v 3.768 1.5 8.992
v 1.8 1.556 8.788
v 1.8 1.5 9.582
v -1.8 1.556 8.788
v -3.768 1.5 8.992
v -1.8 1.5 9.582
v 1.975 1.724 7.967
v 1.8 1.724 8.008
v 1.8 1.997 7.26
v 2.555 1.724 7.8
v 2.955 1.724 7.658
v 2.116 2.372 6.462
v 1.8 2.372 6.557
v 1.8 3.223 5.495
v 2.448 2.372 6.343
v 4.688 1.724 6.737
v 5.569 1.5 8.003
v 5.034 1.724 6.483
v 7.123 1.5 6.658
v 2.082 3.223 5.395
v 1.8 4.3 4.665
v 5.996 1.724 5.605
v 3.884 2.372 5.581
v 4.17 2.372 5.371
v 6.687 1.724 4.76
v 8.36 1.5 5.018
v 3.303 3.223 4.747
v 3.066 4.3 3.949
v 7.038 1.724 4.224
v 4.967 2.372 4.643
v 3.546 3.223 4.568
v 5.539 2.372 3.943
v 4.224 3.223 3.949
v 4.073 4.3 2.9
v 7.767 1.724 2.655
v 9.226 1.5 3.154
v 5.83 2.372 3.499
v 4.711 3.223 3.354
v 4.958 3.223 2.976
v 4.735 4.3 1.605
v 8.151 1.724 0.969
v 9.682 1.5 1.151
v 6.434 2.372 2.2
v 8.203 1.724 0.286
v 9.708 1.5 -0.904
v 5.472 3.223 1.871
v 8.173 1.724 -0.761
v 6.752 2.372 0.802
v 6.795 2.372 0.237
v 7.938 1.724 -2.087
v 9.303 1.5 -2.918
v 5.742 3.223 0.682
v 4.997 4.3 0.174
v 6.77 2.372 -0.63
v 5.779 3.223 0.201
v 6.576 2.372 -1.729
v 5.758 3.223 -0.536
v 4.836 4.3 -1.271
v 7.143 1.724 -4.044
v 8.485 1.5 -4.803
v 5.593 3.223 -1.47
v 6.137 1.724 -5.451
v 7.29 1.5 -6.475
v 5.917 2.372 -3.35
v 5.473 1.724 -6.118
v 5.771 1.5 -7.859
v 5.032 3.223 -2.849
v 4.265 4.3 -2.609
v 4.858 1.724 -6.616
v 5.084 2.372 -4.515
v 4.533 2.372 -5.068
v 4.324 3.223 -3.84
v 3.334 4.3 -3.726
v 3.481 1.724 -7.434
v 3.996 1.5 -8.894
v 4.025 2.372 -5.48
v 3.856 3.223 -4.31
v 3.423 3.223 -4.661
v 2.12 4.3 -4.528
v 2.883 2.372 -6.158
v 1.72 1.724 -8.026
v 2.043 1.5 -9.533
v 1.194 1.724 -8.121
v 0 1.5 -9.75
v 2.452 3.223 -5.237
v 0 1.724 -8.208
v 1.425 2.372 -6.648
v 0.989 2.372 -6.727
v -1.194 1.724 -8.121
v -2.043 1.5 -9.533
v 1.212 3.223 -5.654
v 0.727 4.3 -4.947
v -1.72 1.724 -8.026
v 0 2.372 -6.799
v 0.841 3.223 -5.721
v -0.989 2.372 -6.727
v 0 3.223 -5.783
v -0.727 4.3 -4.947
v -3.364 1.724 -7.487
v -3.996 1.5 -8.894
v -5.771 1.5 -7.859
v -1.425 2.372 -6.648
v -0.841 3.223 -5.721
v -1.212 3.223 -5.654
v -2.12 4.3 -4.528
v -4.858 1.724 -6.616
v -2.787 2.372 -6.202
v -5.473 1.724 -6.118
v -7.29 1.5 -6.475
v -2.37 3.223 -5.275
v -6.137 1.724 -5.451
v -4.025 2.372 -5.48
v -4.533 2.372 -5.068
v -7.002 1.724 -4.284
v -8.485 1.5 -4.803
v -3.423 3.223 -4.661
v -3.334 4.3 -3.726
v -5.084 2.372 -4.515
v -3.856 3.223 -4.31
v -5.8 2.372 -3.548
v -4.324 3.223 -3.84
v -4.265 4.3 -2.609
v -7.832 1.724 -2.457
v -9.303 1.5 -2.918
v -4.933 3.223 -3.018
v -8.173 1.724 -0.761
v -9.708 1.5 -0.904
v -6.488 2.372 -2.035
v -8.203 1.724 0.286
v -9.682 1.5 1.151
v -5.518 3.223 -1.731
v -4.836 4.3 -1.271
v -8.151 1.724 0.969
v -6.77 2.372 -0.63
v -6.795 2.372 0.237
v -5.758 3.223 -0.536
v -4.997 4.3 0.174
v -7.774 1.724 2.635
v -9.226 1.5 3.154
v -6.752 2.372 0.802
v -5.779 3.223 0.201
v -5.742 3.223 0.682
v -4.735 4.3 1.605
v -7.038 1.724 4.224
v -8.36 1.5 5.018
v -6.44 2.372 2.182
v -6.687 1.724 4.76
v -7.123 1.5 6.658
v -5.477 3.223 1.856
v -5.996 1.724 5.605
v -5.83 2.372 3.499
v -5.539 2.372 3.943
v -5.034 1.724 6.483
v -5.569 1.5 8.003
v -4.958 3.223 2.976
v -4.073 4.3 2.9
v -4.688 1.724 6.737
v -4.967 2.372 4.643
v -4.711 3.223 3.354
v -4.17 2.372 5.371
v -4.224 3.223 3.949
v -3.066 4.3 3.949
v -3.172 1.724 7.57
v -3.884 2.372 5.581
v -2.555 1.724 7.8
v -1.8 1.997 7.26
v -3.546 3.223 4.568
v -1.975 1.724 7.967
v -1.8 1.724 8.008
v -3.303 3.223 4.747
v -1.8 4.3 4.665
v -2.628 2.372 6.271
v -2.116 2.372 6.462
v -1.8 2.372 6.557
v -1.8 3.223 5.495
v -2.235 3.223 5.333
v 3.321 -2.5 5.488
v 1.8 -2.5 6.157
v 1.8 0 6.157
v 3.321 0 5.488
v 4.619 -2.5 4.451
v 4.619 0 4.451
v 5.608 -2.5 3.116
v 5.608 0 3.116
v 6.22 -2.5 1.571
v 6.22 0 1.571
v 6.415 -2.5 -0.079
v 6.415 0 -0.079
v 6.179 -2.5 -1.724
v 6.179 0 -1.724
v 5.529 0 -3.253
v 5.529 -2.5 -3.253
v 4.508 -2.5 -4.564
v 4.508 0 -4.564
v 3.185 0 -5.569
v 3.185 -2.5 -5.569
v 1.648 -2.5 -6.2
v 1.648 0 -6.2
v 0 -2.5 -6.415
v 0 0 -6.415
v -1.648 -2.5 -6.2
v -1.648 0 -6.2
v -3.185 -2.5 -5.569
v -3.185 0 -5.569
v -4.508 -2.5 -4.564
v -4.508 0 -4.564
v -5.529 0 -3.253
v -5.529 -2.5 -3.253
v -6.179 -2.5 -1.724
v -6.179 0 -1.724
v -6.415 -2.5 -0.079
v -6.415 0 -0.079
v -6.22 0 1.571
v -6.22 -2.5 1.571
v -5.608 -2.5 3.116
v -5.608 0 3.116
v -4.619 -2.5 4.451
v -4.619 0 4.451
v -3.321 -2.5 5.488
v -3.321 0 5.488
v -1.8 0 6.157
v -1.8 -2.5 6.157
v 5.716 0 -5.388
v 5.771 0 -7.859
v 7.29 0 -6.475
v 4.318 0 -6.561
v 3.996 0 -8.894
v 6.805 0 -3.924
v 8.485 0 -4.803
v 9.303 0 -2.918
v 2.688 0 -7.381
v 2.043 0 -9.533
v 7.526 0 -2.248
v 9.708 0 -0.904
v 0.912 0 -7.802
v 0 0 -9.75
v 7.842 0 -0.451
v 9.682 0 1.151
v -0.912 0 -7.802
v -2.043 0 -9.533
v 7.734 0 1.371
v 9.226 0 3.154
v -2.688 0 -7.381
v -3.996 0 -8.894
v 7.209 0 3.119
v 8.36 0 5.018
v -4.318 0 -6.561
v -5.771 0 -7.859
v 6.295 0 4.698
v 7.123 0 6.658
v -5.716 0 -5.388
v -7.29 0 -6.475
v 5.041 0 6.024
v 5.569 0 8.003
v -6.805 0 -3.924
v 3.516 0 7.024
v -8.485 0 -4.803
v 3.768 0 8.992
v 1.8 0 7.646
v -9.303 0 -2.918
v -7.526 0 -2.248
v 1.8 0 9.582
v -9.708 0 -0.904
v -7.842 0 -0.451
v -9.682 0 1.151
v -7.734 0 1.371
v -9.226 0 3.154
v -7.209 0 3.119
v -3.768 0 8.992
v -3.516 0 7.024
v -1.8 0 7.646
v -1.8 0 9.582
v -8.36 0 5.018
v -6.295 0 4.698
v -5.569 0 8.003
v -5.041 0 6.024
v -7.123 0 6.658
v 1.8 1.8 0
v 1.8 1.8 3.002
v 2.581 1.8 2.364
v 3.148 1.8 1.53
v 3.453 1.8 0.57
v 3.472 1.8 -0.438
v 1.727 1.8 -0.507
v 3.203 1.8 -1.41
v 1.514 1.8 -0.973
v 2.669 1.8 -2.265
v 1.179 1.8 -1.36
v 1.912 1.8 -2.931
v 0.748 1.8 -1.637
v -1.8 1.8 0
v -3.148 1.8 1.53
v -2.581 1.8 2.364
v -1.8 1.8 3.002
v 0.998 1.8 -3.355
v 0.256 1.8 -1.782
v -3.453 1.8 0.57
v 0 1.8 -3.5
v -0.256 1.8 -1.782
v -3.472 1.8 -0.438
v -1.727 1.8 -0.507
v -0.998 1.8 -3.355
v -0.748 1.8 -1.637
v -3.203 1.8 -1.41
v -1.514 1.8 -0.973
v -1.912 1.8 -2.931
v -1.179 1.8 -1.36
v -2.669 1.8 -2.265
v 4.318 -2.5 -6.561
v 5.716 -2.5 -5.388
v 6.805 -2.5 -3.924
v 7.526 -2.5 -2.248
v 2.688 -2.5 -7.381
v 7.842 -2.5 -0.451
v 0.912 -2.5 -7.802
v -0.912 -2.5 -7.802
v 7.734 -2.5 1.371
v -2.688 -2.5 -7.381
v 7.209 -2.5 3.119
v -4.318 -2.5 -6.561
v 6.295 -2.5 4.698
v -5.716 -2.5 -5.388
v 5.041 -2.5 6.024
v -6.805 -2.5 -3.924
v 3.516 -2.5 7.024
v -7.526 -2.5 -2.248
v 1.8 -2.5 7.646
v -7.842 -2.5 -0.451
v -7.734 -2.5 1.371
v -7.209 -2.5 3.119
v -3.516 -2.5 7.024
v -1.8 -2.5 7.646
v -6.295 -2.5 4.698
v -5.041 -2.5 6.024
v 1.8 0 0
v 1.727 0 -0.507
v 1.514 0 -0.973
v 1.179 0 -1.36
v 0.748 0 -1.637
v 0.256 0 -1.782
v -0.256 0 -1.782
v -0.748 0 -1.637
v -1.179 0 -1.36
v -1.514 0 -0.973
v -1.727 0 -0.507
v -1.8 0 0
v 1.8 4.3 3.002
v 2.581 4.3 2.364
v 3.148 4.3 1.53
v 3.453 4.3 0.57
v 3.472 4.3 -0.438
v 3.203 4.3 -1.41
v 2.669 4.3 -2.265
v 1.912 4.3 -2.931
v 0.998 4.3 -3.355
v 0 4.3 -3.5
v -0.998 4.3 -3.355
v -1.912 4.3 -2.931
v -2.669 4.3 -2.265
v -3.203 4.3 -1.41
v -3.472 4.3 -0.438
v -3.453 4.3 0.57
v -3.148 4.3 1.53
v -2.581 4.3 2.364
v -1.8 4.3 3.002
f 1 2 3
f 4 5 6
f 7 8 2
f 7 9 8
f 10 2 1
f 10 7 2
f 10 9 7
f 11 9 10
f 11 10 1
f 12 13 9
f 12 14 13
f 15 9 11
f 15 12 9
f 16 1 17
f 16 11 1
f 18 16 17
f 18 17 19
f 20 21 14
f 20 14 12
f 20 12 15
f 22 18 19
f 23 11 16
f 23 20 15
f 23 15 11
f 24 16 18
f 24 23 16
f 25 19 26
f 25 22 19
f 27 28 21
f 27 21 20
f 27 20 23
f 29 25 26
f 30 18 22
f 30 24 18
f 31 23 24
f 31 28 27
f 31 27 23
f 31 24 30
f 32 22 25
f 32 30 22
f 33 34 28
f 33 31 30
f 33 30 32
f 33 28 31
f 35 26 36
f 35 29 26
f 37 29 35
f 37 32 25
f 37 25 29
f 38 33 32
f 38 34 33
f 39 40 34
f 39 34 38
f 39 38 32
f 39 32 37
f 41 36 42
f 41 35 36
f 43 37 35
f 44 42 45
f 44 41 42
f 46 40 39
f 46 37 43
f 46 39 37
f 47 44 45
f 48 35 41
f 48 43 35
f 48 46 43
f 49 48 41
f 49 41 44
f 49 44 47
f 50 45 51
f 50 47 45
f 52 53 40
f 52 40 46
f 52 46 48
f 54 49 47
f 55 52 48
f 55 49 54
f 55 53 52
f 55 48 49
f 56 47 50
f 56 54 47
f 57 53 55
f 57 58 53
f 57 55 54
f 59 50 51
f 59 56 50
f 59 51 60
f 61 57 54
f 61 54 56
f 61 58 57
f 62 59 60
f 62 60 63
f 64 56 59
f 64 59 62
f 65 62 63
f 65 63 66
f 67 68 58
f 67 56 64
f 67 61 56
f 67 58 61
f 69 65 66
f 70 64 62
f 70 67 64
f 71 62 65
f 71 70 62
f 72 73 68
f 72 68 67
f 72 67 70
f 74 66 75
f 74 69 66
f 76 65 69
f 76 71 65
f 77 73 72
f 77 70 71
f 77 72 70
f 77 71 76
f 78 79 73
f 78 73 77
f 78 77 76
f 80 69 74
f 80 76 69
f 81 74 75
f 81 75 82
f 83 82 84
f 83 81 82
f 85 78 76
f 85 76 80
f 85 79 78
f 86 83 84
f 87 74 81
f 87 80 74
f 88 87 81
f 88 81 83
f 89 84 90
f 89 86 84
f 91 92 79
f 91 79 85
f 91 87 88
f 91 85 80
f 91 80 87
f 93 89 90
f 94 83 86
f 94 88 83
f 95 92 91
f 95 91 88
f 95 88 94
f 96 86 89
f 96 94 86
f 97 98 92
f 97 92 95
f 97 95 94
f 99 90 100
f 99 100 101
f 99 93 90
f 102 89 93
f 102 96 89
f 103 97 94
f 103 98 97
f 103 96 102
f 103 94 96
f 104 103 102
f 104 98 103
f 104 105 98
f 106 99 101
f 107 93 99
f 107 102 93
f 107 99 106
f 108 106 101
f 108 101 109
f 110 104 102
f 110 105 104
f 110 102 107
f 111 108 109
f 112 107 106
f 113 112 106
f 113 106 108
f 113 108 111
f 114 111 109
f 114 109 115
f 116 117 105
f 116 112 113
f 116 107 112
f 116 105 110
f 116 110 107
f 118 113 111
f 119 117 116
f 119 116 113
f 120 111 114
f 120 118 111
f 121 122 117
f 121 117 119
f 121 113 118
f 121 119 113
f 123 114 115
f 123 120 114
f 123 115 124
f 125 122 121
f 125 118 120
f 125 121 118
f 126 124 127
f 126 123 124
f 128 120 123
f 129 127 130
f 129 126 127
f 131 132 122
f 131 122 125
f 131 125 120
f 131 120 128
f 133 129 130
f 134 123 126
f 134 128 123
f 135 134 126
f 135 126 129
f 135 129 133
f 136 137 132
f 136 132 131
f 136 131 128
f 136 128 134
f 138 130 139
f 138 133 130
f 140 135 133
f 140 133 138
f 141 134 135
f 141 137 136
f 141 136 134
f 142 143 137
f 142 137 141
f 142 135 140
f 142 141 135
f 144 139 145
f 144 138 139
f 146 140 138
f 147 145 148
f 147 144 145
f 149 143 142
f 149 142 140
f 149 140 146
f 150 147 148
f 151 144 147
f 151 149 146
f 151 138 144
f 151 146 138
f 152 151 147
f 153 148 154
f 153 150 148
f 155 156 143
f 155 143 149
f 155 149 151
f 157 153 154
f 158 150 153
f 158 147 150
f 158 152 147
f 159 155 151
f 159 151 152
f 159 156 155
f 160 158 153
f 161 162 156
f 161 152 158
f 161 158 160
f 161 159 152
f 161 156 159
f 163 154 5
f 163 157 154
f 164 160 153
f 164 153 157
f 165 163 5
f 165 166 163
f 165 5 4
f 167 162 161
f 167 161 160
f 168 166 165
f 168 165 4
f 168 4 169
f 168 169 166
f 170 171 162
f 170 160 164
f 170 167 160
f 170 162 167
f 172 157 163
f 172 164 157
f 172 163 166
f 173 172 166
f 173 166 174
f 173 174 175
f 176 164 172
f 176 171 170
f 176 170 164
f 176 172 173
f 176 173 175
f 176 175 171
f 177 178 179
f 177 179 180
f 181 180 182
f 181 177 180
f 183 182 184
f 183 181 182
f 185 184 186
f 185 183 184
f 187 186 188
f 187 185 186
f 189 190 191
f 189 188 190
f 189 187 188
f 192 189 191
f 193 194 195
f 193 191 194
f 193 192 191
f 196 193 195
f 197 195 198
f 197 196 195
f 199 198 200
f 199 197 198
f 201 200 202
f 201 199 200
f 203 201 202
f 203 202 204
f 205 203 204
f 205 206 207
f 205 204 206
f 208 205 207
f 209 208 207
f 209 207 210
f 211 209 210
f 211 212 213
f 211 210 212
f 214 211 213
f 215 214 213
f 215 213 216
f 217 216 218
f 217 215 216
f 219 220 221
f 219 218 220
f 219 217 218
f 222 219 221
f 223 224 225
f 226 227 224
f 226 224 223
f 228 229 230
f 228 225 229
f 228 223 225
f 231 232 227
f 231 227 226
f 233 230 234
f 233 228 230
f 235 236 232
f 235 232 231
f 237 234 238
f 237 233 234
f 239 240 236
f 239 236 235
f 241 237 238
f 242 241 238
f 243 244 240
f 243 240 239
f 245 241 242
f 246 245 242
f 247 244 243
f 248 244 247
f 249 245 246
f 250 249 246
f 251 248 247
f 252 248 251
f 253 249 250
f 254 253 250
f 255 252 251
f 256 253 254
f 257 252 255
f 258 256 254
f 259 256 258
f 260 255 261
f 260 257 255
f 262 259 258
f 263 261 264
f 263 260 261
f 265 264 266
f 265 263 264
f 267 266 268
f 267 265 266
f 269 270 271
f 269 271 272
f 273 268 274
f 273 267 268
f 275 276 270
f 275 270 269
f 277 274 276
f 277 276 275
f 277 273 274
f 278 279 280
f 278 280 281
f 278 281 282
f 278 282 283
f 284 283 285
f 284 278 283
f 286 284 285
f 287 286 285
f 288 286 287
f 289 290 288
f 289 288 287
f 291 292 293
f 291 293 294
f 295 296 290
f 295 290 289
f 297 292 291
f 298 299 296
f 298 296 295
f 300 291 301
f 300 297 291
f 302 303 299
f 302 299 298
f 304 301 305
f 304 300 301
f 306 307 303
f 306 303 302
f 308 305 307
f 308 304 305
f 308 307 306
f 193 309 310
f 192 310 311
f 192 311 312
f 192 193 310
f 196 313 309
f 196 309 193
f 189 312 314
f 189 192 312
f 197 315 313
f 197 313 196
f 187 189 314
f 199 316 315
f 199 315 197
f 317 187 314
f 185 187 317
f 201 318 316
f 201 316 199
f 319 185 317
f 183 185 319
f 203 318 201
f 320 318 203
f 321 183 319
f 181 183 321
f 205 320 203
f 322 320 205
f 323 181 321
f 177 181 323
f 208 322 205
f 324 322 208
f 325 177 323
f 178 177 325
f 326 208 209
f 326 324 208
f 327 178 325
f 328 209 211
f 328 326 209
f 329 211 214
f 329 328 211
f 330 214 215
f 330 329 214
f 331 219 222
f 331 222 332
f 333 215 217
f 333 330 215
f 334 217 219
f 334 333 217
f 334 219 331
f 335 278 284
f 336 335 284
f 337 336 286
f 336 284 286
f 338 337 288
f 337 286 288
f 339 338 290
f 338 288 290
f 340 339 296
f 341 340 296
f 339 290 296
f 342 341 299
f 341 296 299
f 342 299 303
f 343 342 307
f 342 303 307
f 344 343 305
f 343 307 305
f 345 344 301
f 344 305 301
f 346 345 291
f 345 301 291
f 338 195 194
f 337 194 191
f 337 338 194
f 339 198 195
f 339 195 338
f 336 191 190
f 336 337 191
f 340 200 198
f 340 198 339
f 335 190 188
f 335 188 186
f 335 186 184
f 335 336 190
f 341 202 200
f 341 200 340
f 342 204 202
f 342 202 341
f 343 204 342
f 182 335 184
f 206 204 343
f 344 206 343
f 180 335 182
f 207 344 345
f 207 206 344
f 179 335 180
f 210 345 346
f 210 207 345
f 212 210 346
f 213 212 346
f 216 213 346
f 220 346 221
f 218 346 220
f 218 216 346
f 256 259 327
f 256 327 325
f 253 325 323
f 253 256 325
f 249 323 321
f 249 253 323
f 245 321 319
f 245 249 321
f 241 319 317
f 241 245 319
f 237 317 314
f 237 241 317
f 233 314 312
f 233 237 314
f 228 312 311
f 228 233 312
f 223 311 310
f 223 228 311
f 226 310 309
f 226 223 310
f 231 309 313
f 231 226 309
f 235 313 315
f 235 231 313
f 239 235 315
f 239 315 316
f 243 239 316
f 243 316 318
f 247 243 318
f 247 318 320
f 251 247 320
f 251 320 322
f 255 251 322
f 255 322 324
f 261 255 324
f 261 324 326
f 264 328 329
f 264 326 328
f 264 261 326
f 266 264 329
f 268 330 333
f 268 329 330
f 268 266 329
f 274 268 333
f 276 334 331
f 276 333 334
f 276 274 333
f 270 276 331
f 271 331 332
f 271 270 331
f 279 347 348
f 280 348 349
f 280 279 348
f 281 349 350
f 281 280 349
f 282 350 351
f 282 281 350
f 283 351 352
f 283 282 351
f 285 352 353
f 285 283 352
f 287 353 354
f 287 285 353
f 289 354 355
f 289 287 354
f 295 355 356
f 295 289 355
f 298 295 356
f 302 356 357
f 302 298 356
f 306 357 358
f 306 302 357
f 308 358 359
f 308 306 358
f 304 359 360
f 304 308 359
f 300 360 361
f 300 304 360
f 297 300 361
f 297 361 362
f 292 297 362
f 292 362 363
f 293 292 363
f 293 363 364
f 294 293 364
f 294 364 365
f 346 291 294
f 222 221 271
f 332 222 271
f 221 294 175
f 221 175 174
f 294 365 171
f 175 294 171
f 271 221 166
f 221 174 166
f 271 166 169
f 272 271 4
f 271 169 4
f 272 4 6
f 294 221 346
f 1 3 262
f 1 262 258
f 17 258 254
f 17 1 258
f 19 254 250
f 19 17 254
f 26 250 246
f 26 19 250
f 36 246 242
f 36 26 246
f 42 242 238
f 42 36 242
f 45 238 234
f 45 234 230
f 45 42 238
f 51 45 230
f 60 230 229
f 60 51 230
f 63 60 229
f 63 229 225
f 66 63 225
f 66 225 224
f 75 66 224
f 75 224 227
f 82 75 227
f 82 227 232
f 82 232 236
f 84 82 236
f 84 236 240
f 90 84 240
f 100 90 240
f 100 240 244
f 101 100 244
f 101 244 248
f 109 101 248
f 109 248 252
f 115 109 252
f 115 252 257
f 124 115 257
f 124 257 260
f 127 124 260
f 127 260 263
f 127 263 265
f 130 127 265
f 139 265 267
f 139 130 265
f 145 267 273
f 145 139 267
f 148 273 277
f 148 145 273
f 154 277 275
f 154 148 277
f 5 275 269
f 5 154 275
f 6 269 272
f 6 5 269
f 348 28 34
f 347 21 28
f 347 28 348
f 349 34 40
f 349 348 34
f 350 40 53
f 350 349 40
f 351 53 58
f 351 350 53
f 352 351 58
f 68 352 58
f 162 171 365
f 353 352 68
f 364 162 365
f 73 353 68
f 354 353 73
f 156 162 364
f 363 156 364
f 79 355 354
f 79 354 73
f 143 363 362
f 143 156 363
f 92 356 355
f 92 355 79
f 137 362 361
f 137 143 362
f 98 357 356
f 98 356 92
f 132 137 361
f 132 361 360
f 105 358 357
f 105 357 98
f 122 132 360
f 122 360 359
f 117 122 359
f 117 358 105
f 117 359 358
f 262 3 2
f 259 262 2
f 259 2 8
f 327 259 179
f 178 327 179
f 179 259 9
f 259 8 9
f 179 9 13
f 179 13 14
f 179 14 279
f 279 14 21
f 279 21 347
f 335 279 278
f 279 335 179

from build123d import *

# Parameters (mm, degrees)
TAGLIO_ESTRUSIONE1_DEPTH = 16.374166644


with BuildPart() as part:
    # Schizzo1 → Rivoluzione1 (revolve)
    with BuildSketch(Plane.XY, mode=Mode.PRIVATE) as rivoluzione1_sk:
        with BuildLine():
            Line((0, 0), (-6.415, 0))
            Line((-6.415, 0), (-6.415, -2.5))
            Line((-6.415, -2.5), (-7.855, -2.5))
            Line((-7.855, -2.5), (-7.855, 0))
            Line((-7.855, 0), (-9.75, 0))
            Line((-9.75, 0), (-9.75, 1.5))
            ThreePointArc((-9.75, 1.5), (-6.993076896, 2.252094735), (-5, 4.3))
            Line((-5, 4.3), (-3.5, 4.3))
            Line((-3.5, 4.3), (-3.5, 1.8))
            Line((-3.5, 1.8), (0, 1.8))
            Line((0, 1.8), (0, 0))
        make_face()
    revolve(rivoluzione1_sk.sketch.rotate(Axis((0, -12.420504762, 0), (0, 1, 0)), 270), axis=Axis((0, -12.420504762, 0), (0, 1, 0)))

    # Schizzo2 → Taglio-Estrusione1 (cut, through all)
    with BuildSketch(Plane(origin=(0, 4.3, 0), x_dir=(1, 0, 0), z_dir=(0, 1, 0))):
        with BuildLine():
            Line((1.8, -9.582405752), (1.8, 0))
            ThreePointArc((1.8, 0), (0, 1.8), (-1.8, 0))
            Line((-1.8, 0), (-1.8, -9.582405752))
            ThreePointArc((-1.8, -9.582405752), (0, -9.75), (1.8, -9.582405752))
        make_face()
    extrude(amount=-TAGLIO_ESTRUSIONE1_DEPTH, mode=Mode.SUBTRACT)


solid = part.part
